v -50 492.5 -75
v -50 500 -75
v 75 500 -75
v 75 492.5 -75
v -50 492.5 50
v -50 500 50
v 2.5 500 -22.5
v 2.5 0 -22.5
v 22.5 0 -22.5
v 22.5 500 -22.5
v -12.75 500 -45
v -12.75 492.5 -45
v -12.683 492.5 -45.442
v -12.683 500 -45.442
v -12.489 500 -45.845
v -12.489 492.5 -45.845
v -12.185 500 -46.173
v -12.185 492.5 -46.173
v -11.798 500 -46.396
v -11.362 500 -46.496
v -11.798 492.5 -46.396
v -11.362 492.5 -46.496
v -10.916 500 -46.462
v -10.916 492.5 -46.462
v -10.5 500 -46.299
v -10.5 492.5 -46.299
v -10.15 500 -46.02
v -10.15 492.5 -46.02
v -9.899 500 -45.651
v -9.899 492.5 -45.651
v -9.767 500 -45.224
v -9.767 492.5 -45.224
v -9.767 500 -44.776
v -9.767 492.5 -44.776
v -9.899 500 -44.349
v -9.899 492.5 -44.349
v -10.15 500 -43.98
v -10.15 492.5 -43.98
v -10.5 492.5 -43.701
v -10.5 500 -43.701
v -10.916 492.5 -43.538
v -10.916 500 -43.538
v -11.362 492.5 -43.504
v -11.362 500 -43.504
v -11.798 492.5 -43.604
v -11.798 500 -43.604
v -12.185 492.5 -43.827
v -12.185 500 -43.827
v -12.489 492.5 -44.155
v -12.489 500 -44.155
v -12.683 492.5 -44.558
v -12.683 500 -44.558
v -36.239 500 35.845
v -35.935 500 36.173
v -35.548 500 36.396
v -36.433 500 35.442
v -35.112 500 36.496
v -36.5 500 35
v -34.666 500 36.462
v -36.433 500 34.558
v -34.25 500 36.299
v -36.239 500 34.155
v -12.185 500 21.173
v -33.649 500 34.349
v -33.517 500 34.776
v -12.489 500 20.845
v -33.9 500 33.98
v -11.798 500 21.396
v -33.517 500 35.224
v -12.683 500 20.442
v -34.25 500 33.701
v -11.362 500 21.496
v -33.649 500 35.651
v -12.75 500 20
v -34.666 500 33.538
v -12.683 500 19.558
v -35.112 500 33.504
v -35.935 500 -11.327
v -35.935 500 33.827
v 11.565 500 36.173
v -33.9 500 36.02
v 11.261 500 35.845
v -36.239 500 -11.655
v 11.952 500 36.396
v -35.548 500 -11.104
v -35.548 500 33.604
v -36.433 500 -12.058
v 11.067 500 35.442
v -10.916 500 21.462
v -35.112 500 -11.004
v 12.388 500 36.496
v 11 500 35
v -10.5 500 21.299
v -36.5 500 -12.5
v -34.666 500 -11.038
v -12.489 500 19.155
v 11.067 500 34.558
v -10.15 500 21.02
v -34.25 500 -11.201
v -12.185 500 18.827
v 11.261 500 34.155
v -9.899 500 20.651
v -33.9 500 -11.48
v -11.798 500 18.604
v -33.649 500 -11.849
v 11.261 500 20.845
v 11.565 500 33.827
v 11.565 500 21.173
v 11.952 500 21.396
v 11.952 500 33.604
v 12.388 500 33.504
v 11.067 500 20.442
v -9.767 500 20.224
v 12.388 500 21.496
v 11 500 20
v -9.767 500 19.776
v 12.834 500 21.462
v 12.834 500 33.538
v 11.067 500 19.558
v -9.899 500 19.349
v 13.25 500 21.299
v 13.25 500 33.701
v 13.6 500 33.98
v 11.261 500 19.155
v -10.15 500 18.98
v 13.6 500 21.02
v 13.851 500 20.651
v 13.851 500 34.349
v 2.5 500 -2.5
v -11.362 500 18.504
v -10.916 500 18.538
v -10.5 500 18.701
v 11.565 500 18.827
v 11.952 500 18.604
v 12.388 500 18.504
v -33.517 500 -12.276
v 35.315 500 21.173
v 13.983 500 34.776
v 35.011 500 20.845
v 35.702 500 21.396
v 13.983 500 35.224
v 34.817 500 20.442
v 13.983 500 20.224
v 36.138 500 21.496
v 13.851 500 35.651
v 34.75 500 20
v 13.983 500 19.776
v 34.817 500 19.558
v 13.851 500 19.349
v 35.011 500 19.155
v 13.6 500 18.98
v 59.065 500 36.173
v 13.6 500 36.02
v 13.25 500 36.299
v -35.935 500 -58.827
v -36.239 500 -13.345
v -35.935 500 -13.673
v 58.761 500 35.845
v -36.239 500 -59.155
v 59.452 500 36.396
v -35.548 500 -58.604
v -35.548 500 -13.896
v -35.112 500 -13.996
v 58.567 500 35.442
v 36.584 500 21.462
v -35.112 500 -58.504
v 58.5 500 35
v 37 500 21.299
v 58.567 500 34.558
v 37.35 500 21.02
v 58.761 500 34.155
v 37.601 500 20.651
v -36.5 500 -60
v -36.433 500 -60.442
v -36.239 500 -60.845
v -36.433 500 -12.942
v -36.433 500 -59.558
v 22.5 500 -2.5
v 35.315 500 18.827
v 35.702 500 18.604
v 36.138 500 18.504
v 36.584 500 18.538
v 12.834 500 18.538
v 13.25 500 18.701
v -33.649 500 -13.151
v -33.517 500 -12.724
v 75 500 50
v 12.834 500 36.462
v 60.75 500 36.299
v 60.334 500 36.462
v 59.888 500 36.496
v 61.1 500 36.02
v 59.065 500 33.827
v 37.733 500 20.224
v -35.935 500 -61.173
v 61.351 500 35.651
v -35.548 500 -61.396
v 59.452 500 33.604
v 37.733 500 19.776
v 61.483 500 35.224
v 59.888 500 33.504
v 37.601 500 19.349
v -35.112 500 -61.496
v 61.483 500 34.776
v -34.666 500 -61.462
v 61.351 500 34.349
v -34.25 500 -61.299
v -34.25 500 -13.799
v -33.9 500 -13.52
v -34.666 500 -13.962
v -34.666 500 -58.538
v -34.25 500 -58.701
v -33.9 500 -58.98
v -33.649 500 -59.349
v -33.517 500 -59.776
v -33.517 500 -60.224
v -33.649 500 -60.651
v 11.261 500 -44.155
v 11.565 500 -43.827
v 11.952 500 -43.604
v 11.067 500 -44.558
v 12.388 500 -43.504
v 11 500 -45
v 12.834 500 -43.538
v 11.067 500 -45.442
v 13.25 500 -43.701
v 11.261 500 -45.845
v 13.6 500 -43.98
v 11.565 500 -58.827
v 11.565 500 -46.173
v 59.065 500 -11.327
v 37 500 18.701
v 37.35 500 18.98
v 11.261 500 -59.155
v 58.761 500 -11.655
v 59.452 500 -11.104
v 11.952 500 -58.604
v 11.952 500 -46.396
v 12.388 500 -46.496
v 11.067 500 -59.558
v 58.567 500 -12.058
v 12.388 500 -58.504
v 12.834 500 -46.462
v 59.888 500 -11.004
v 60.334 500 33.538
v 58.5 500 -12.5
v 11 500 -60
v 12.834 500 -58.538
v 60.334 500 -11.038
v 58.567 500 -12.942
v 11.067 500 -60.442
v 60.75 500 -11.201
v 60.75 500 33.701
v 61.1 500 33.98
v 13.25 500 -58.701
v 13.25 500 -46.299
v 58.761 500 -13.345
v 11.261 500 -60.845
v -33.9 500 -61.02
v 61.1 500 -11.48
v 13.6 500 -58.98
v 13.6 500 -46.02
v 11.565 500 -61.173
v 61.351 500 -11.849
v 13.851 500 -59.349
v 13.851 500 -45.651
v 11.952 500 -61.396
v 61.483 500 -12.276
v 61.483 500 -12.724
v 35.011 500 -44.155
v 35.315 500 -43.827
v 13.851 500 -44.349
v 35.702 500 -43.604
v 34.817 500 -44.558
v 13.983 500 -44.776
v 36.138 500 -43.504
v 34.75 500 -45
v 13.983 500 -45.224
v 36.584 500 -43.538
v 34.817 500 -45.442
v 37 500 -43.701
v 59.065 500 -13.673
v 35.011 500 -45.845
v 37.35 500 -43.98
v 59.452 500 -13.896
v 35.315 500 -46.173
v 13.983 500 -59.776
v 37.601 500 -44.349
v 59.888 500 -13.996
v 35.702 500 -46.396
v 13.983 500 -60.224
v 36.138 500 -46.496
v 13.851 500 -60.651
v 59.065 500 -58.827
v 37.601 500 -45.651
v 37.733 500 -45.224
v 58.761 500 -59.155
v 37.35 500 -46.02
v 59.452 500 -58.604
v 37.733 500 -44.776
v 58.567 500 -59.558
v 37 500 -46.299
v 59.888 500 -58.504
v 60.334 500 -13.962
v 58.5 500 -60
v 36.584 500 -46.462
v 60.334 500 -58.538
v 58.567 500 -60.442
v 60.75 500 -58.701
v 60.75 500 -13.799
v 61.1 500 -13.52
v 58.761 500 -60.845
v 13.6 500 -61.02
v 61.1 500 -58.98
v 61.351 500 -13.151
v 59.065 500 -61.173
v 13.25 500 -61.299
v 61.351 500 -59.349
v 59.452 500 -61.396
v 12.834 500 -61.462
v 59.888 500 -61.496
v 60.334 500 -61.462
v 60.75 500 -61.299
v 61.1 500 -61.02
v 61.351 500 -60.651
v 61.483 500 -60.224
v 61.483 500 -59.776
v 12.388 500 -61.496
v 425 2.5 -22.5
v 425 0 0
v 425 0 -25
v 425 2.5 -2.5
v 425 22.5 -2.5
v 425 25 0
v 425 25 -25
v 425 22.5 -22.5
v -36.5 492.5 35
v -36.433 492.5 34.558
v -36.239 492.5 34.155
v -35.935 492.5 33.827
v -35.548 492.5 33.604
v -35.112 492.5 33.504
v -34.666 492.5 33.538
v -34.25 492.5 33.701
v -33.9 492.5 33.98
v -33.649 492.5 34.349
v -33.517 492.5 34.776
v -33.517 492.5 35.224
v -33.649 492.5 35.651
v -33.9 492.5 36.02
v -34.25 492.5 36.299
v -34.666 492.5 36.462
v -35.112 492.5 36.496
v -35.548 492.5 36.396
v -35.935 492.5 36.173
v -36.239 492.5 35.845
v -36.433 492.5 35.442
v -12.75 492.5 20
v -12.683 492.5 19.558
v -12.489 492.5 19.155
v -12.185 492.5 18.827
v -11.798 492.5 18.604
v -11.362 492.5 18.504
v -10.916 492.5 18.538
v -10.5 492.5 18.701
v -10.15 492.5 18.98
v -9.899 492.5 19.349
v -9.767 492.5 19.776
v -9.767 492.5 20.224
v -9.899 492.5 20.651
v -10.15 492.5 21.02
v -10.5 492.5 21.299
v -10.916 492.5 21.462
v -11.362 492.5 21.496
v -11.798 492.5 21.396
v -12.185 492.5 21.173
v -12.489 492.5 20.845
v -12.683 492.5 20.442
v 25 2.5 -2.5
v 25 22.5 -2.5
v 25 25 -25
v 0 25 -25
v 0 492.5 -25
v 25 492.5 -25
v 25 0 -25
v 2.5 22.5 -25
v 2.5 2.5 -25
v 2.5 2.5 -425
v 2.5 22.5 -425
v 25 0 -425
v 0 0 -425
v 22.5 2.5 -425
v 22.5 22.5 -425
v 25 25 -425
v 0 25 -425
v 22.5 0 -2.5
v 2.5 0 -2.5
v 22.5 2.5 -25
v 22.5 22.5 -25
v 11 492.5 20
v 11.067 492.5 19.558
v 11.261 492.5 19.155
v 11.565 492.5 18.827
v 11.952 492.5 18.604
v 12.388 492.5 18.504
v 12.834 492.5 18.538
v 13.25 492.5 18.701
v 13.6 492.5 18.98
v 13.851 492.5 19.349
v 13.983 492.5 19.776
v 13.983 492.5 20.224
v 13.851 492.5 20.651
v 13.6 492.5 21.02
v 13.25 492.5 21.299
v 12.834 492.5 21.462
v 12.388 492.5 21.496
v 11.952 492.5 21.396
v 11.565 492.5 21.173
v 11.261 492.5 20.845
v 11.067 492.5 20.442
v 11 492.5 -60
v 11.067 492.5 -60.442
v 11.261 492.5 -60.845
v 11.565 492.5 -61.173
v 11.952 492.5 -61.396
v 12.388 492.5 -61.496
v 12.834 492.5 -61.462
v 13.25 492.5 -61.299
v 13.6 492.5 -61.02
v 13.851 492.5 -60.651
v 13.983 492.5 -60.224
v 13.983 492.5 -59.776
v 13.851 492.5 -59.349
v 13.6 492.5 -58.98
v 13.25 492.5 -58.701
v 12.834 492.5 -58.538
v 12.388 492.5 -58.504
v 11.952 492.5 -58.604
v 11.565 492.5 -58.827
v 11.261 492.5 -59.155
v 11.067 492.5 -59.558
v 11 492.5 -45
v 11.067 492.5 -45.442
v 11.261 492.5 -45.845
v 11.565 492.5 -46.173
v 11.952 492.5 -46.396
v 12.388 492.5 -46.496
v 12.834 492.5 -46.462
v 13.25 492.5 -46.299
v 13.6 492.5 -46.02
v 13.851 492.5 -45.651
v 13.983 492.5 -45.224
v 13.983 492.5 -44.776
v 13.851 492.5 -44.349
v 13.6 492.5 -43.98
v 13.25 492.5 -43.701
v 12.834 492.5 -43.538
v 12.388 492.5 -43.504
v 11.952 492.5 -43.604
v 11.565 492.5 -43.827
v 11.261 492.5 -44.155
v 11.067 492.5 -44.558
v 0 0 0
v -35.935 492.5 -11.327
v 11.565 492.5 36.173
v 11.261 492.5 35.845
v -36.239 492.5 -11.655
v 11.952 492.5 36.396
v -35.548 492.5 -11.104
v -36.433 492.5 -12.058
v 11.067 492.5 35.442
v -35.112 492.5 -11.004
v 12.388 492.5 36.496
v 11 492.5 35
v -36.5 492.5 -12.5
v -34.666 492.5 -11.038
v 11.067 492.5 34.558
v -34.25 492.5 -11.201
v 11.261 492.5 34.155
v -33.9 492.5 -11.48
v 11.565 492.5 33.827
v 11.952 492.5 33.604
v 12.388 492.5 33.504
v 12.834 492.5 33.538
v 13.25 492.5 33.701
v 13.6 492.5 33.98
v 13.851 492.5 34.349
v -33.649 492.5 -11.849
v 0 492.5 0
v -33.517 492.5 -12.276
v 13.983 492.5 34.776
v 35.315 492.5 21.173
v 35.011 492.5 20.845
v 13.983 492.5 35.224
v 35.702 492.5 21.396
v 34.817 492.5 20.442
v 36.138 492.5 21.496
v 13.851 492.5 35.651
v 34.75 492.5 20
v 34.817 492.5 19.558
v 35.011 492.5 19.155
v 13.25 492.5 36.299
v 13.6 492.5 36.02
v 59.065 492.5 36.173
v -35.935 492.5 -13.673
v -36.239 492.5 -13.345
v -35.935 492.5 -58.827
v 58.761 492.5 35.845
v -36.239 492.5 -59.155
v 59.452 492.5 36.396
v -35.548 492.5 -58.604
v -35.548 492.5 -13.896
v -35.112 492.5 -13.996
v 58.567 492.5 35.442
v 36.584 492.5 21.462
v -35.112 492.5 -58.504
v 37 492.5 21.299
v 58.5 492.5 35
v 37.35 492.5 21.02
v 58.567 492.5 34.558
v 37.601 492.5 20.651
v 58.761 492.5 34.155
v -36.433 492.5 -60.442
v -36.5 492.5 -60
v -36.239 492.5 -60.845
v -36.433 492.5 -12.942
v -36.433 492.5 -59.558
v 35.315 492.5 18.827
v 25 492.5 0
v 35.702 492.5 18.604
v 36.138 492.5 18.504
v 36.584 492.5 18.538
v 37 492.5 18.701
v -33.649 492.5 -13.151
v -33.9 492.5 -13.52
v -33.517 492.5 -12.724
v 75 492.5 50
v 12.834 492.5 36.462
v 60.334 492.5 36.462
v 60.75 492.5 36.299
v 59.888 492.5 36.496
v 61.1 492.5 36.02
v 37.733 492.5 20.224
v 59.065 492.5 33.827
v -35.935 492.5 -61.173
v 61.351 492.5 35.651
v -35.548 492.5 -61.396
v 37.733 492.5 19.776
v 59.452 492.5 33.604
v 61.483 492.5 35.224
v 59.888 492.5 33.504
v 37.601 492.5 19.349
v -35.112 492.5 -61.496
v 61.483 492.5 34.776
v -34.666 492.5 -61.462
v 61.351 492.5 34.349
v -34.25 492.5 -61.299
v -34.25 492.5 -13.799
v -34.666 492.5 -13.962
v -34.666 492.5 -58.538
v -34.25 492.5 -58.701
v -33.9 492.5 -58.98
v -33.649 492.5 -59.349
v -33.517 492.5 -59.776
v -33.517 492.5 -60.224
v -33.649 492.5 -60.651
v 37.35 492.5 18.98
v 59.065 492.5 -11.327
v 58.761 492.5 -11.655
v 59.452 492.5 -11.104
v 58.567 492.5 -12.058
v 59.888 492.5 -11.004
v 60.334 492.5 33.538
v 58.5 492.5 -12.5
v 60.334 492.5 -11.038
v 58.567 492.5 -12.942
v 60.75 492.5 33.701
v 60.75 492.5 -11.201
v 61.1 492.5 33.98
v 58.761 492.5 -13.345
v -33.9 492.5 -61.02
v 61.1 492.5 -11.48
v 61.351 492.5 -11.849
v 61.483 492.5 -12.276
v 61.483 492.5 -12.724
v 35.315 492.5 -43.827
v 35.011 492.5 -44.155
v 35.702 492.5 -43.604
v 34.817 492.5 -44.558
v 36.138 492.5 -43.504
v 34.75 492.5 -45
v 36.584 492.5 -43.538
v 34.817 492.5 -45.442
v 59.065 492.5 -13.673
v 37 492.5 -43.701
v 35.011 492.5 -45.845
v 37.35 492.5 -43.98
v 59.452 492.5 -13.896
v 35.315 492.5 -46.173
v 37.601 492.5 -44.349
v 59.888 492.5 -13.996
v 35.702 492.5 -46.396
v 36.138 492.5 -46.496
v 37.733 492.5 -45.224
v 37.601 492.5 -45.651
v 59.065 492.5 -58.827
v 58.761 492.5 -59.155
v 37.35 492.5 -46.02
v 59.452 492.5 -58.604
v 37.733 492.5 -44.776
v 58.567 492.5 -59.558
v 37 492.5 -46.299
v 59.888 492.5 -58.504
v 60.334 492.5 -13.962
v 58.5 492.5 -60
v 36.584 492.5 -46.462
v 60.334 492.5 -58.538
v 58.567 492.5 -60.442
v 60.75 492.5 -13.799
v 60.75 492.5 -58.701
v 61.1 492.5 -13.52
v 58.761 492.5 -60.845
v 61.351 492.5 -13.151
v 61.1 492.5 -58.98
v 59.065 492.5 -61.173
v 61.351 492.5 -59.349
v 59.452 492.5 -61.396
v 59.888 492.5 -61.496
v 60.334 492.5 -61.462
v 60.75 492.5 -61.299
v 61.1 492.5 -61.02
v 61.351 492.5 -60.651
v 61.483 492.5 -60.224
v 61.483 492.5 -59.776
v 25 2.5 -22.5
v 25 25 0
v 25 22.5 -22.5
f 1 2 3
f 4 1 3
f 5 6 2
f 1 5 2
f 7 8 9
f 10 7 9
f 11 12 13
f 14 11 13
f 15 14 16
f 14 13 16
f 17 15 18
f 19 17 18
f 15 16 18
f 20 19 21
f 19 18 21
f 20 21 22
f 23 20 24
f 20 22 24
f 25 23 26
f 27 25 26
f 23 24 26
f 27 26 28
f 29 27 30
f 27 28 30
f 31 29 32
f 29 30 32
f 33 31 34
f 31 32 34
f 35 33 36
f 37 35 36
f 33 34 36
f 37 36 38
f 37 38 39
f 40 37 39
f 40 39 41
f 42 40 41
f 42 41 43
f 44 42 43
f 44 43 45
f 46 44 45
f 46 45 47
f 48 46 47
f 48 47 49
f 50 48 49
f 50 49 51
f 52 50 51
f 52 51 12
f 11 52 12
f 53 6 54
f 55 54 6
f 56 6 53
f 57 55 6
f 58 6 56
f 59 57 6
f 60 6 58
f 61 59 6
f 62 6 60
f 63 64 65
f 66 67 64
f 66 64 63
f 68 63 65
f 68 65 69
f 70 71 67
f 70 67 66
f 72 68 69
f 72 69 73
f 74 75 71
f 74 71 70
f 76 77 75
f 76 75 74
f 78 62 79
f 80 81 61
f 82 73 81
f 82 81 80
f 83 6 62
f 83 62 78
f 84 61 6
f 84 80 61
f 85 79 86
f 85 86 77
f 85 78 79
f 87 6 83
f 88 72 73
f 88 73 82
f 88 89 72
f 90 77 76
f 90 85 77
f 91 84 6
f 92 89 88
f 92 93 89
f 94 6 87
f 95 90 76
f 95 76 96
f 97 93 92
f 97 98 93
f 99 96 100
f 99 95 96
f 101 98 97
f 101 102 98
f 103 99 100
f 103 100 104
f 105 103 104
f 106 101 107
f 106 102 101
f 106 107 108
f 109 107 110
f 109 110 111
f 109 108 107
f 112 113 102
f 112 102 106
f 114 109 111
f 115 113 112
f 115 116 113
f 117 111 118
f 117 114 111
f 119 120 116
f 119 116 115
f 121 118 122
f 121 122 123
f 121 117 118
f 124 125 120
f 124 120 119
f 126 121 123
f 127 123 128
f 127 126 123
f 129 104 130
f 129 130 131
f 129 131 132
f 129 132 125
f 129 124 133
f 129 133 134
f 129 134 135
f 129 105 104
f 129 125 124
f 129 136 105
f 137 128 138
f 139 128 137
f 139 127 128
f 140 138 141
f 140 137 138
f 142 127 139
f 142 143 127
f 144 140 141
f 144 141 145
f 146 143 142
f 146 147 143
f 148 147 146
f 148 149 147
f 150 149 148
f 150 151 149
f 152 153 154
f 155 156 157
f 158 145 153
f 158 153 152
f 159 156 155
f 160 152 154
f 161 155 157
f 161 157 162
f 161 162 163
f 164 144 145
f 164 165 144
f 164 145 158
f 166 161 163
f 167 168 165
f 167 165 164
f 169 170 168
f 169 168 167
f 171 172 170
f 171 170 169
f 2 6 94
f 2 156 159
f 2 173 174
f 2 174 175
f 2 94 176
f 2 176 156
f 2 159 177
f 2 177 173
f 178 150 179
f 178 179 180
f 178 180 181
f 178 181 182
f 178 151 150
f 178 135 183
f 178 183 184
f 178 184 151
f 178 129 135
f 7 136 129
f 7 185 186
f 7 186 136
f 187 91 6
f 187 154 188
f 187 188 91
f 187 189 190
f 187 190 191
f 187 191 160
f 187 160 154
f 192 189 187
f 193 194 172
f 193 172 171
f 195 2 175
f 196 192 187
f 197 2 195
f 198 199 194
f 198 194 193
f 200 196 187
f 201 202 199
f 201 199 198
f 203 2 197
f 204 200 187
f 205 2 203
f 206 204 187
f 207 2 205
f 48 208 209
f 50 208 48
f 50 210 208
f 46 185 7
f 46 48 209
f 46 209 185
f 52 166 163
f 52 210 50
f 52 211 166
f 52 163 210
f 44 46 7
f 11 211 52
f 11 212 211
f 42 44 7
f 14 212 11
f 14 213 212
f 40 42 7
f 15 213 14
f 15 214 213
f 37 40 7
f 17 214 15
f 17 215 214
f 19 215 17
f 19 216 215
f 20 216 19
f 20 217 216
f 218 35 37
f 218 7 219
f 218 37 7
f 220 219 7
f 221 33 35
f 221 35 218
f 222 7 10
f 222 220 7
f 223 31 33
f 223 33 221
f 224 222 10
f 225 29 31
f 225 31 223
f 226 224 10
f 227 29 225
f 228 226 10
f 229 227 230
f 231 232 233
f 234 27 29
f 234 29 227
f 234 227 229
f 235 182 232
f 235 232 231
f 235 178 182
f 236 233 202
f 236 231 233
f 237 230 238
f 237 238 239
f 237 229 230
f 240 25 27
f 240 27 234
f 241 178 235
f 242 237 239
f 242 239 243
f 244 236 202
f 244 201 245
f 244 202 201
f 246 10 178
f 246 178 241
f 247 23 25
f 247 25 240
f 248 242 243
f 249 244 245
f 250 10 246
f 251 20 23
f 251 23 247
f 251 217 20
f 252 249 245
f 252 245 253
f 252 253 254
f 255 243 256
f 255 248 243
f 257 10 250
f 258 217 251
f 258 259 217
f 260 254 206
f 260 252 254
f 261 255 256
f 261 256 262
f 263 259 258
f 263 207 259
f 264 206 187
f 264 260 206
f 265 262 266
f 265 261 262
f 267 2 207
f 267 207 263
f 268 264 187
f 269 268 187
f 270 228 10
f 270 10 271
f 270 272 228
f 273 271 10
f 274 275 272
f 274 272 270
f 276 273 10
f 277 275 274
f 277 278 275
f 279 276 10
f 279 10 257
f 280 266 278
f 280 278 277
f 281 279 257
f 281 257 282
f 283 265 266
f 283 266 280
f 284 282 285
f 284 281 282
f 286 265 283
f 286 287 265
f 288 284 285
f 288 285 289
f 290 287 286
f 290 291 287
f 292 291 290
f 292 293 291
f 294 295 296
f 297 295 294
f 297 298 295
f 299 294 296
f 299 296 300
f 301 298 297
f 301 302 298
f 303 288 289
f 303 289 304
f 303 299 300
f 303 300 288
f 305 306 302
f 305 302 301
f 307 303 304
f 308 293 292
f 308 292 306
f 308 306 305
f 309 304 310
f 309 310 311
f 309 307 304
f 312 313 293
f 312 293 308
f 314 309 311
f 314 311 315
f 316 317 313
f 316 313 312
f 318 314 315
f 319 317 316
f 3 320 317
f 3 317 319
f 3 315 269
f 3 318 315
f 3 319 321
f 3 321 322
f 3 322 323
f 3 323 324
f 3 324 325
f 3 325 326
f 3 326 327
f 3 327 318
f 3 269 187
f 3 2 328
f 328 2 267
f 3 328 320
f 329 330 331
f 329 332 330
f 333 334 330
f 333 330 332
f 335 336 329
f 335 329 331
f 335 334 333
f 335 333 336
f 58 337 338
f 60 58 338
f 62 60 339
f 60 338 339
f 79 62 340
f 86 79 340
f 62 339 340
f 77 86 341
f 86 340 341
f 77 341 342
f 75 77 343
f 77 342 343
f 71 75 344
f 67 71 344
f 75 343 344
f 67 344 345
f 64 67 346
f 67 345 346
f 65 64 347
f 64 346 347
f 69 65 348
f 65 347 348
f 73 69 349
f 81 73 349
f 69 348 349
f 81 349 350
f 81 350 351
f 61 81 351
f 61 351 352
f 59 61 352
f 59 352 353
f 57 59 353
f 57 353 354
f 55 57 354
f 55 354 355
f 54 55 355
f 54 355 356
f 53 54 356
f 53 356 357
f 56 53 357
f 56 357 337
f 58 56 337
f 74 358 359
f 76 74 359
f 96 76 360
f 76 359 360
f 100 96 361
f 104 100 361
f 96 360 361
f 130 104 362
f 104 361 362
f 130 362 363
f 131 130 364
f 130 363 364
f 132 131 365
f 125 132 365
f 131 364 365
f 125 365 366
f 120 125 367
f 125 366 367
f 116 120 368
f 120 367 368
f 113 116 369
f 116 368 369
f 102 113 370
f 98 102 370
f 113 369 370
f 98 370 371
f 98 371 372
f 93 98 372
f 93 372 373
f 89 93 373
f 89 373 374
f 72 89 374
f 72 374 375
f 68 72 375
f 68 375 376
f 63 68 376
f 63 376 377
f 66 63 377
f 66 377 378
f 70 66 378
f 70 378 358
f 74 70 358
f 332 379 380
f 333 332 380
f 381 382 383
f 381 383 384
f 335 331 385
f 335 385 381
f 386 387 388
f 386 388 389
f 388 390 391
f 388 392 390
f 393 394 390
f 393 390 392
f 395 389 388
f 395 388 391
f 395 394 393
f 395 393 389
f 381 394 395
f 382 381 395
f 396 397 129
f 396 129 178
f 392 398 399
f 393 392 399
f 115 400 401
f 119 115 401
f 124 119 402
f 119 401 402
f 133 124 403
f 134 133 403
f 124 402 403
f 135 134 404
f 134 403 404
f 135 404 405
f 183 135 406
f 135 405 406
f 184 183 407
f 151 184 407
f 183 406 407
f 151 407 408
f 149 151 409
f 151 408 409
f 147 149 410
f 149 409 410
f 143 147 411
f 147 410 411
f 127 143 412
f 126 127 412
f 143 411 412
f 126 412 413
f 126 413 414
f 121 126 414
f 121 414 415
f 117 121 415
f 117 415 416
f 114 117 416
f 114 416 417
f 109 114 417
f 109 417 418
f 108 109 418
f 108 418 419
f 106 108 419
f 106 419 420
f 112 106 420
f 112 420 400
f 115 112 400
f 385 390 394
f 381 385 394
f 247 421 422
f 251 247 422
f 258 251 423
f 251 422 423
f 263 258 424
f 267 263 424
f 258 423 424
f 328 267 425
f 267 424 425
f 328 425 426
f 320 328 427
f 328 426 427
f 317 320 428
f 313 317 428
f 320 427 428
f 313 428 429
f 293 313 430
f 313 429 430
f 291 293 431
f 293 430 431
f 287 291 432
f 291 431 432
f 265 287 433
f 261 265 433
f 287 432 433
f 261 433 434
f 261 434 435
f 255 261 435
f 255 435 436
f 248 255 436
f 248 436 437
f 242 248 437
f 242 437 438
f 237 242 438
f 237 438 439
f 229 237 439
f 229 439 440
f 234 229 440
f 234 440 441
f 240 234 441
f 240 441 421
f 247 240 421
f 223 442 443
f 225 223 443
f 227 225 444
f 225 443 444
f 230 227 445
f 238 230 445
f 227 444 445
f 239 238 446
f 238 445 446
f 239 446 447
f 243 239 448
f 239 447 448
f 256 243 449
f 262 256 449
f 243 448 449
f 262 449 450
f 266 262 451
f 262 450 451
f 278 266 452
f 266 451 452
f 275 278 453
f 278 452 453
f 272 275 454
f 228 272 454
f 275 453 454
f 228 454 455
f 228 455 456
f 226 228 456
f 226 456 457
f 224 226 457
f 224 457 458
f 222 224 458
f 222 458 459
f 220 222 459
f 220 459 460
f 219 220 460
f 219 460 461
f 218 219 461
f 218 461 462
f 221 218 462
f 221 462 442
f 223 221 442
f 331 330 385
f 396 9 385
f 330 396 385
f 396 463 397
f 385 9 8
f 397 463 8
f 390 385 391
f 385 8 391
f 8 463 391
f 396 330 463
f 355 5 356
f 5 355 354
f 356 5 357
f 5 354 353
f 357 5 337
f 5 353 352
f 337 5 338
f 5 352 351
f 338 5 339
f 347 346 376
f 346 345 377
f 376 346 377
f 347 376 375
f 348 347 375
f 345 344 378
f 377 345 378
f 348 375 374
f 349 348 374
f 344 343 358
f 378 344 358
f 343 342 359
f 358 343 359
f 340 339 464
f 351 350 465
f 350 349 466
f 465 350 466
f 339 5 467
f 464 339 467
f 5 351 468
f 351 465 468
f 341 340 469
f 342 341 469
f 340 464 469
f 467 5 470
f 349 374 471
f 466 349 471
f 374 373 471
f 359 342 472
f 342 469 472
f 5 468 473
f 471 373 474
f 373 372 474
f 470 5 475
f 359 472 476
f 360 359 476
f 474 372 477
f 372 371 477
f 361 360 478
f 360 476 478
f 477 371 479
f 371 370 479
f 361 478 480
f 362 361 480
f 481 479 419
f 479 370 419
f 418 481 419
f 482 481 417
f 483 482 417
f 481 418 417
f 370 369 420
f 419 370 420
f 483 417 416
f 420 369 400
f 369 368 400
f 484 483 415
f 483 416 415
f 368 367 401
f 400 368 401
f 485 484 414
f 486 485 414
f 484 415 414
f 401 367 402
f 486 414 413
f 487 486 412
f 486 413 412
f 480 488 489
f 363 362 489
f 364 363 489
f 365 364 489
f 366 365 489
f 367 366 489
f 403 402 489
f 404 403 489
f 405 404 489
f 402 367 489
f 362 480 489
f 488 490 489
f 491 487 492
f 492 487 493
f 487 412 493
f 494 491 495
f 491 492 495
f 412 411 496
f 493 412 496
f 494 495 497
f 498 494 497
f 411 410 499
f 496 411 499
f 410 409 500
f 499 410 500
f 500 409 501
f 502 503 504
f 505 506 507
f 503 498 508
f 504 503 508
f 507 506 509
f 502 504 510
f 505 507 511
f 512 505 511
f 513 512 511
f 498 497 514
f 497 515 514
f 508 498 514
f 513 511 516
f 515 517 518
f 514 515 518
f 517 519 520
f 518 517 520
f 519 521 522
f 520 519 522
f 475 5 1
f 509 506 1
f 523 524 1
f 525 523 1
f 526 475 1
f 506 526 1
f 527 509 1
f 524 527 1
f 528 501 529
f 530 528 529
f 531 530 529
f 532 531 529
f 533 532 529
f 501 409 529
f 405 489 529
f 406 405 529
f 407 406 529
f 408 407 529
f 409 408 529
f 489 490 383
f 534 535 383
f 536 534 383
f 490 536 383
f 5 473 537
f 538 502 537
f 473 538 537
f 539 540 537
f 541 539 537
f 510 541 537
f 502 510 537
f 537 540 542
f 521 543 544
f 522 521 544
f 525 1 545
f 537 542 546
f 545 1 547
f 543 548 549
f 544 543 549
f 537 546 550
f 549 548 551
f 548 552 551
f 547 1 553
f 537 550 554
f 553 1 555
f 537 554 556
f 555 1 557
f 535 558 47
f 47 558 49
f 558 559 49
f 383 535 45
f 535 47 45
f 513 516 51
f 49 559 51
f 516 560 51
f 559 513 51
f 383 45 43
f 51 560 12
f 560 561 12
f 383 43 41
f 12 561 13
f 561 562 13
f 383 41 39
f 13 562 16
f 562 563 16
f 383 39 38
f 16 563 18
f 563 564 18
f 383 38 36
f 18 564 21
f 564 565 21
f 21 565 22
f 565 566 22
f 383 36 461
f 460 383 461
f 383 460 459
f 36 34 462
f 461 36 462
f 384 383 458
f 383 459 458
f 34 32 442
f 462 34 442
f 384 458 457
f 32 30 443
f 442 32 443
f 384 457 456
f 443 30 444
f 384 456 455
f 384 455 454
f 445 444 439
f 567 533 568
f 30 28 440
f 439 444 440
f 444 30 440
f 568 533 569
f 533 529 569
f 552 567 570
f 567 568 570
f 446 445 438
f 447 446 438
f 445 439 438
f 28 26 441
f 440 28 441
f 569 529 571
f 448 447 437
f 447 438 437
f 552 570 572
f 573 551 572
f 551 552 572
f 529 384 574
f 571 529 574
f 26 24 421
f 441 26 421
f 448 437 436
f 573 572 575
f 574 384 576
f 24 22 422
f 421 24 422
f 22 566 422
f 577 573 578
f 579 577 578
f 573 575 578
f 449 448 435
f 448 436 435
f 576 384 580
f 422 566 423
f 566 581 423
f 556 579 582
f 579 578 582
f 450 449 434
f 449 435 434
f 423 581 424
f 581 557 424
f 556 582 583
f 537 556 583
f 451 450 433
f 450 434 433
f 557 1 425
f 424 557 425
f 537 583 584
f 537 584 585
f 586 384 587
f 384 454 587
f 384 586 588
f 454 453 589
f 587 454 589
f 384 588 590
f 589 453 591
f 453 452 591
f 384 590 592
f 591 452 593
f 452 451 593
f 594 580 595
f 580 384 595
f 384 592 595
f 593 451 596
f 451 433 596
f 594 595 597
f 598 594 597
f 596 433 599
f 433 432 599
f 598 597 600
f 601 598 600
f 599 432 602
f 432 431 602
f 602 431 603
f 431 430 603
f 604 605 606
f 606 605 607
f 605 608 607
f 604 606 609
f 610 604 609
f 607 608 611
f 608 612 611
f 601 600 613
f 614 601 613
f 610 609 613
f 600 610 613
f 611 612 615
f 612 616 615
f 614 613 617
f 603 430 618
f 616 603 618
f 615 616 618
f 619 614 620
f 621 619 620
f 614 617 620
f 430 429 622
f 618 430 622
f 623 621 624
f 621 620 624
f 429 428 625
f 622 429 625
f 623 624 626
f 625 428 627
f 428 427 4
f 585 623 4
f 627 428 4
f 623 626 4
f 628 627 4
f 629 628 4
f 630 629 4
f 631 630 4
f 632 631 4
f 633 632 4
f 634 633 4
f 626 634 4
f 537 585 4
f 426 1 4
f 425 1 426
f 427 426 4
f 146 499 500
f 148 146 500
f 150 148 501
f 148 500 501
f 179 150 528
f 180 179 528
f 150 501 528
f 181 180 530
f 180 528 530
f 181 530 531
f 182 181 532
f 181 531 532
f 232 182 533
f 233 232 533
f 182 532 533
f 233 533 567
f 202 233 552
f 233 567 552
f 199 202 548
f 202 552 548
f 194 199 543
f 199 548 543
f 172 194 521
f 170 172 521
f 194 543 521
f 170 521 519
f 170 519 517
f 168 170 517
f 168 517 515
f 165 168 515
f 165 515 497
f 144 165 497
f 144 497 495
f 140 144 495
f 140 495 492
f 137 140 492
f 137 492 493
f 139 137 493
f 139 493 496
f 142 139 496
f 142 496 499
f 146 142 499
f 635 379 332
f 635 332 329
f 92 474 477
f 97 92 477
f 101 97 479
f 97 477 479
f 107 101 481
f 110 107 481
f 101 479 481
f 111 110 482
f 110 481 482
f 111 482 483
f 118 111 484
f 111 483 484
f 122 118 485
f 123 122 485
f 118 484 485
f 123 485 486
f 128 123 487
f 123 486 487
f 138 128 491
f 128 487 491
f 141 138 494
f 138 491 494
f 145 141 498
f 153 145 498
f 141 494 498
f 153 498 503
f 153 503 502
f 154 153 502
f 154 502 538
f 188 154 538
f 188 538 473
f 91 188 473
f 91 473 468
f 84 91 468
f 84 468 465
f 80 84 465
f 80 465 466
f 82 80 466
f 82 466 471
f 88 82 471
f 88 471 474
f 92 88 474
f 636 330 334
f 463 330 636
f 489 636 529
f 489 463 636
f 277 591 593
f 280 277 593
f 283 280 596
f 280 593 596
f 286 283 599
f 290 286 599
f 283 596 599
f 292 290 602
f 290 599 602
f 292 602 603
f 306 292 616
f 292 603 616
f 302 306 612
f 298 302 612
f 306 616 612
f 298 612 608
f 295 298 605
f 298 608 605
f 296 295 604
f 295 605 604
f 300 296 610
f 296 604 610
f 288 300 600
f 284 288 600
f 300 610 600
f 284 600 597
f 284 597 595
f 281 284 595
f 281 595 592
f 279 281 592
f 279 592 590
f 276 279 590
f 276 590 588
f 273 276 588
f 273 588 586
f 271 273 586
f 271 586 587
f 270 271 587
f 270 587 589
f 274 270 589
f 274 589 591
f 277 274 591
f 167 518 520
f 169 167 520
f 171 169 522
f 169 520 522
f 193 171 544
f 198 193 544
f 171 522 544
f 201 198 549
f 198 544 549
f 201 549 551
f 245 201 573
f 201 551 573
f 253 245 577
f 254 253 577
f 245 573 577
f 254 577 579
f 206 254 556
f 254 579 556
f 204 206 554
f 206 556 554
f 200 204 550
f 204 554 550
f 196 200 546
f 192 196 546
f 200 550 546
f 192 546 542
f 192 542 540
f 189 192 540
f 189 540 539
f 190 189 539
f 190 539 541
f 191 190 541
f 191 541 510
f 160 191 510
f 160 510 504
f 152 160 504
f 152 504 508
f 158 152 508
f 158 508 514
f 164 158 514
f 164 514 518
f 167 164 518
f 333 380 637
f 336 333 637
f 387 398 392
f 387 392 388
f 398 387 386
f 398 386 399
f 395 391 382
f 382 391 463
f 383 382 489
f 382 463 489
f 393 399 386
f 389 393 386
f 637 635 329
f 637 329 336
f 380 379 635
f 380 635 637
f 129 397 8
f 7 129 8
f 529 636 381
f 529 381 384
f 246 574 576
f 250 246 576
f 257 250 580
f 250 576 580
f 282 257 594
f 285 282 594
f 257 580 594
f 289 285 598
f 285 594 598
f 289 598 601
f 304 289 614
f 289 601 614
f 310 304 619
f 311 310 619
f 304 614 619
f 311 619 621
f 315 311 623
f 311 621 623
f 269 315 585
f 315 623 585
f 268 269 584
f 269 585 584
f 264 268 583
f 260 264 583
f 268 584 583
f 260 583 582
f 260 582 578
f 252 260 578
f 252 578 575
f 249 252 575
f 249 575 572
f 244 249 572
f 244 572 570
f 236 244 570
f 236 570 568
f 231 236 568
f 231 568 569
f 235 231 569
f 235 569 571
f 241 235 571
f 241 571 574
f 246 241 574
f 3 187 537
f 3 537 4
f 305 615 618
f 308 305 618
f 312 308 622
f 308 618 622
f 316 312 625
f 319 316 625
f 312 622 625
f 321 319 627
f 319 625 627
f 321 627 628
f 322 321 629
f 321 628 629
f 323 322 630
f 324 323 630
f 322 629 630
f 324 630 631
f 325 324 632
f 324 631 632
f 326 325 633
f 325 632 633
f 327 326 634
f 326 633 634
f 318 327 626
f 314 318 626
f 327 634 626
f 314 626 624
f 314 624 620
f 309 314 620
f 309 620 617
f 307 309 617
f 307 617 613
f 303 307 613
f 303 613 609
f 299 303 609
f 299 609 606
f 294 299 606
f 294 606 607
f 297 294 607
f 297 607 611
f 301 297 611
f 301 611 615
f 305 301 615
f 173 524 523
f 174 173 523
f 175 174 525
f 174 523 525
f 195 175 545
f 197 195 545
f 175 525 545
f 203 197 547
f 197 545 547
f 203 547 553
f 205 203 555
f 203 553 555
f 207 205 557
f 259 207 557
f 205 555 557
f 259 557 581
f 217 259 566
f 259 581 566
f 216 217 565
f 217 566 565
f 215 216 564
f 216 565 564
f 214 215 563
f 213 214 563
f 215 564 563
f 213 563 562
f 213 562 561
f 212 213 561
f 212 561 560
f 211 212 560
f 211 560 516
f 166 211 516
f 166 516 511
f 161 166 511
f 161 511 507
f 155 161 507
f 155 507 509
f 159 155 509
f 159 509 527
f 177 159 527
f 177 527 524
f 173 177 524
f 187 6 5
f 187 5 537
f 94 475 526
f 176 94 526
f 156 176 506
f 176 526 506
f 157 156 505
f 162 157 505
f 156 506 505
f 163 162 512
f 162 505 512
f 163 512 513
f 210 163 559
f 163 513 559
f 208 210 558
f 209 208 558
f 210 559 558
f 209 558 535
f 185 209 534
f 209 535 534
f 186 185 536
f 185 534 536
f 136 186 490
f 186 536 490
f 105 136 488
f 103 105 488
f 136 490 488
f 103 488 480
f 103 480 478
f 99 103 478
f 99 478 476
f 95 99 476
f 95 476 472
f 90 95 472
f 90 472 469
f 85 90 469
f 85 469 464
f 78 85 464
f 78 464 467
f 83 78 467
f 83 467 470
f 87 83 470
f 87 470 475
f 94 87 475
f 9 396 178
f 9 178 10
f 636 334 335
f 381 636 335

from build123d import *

# Parameters (mm, degrees)
SKETCH1_W             = 25
SKETCH1_H             = 25
SKETCH1_W_2           = 20
SKETCH1_H_2           = 20
BOSS_EXTRUDE1_DEPTH   = 500
SKETCH2_W             = 125
SKETCH2_H             = 125
SKETCH2_W_2           = 25
SKETCH2_H_2           = 25
BOSS_EXTRUDE2_DEPTH   = 7.5
F_3_0MM_DOWEL_HOLE1_D = 3
SKETCH7_W             = 25
SKETCH7_H             = 25
SKETCH7_W_2           = 20
SKETCH7_H_2           = 20
BOSS_EXTRUDE3_DEPTH   = 400
SKETCH8_W             = 25
SKETCH8_H             = 25
SKETCH8_W_2           = 20
SKETCH8_H_2           = 20
BOSS_EXTRUDE4_DEPTH   = 400


with BuildPart() as part:
    # Sketch1 → Boss-Extrude1 (new body)
    with BuildSketch(Plane(origin=(0, 0, 0), x_dir=(1, 0, 0), z_dir=(0, 1, 0))):
        with Locations((12.5, 12.5)):
            Rectangle(SKETCH1_W, SKETCH1_H)
        with Locations((12.5, 12.5)):
            Rectangle(SKETCH1_W_2, SKETCH1_H_2, mode=Mode.SUBTRACT)
    extrude(amount=BOSS_EXTRUDE1_DEPTH)

    # Sketch2 → Boss-Extrude2 (add)
    with BuildSketch(Plane(origin=(0, 500, 0), x_dir=(1, 0, 0), z_dir=(0, 1, 0))):
        with Locations((12.5, 12.5)):
            Rectangle(SKETCH2_W, SKETCH2_H)
        with Locations((12.5, 12.5)):
            Rectangle(SKETCH2_W_2, SKETCH2_H_2, mode=Mode.SUBTRACT)
    extrude(amount=-BOSS_EXTRUDE2_DEPTH)

    # Ø3.0mm Dowel Hole1 (through all)
    with Locations(Plane(origin=(0, 500, 0), x_dir=(1, 0, 0), z_dir=(0, 1, 0))):
        with Locations((-35, 60), (12.5, 60), (60, 60), (60, 12.5), (60, -35), (12.5, -35), (-35, -35), (-35, 12.5), (12.5, 45), (12.5, -20), (-11.25, 45), (36.25, 45), (-11.25, -20), (36.25, -20)):
            Hole(F_3_0MM_DOWEL_HOLE1_D / 2)

    # Sketch7 → Boss-Extrude3 (add)
    with BuildSketch(Plane(origin=(0, 0, -25), x_dir=(-1, 0, 0), z_dir=(0, 0, -1))):
        with Locations((-12.5, 12.5)):
            Rectangle(SKETCH7_W, SKETCH7_H)
        with Locations((-12.5, 12.5)):
            Rectangle(SKETCH7_W_2, SKETCH7_H_2, mode=Mode.SUBTRACT)
    extrude(amount=BOSS_EXTRUDE3_DEPTH)

    # Sketch8 → Boss-Extrude4 (add)
    with BuildSketch(Plane(origin=(25, 0, 0), x_dir=(0, 0, -1), z_dir=(1, 0, 0))):
        with Locations((12.5, 12.5)):
            Rectangle(SKETCH8_W, SKETCH8_H)
        with Locations((12.5, 12.5)):
            Rectangle(SKETCH8_W_2, SKETCH8_H_2, mode=Mode.SUBTRACT)
    extrude(amount=BOSS_EXTRUDE4_DEPTH)


solid = part.part
